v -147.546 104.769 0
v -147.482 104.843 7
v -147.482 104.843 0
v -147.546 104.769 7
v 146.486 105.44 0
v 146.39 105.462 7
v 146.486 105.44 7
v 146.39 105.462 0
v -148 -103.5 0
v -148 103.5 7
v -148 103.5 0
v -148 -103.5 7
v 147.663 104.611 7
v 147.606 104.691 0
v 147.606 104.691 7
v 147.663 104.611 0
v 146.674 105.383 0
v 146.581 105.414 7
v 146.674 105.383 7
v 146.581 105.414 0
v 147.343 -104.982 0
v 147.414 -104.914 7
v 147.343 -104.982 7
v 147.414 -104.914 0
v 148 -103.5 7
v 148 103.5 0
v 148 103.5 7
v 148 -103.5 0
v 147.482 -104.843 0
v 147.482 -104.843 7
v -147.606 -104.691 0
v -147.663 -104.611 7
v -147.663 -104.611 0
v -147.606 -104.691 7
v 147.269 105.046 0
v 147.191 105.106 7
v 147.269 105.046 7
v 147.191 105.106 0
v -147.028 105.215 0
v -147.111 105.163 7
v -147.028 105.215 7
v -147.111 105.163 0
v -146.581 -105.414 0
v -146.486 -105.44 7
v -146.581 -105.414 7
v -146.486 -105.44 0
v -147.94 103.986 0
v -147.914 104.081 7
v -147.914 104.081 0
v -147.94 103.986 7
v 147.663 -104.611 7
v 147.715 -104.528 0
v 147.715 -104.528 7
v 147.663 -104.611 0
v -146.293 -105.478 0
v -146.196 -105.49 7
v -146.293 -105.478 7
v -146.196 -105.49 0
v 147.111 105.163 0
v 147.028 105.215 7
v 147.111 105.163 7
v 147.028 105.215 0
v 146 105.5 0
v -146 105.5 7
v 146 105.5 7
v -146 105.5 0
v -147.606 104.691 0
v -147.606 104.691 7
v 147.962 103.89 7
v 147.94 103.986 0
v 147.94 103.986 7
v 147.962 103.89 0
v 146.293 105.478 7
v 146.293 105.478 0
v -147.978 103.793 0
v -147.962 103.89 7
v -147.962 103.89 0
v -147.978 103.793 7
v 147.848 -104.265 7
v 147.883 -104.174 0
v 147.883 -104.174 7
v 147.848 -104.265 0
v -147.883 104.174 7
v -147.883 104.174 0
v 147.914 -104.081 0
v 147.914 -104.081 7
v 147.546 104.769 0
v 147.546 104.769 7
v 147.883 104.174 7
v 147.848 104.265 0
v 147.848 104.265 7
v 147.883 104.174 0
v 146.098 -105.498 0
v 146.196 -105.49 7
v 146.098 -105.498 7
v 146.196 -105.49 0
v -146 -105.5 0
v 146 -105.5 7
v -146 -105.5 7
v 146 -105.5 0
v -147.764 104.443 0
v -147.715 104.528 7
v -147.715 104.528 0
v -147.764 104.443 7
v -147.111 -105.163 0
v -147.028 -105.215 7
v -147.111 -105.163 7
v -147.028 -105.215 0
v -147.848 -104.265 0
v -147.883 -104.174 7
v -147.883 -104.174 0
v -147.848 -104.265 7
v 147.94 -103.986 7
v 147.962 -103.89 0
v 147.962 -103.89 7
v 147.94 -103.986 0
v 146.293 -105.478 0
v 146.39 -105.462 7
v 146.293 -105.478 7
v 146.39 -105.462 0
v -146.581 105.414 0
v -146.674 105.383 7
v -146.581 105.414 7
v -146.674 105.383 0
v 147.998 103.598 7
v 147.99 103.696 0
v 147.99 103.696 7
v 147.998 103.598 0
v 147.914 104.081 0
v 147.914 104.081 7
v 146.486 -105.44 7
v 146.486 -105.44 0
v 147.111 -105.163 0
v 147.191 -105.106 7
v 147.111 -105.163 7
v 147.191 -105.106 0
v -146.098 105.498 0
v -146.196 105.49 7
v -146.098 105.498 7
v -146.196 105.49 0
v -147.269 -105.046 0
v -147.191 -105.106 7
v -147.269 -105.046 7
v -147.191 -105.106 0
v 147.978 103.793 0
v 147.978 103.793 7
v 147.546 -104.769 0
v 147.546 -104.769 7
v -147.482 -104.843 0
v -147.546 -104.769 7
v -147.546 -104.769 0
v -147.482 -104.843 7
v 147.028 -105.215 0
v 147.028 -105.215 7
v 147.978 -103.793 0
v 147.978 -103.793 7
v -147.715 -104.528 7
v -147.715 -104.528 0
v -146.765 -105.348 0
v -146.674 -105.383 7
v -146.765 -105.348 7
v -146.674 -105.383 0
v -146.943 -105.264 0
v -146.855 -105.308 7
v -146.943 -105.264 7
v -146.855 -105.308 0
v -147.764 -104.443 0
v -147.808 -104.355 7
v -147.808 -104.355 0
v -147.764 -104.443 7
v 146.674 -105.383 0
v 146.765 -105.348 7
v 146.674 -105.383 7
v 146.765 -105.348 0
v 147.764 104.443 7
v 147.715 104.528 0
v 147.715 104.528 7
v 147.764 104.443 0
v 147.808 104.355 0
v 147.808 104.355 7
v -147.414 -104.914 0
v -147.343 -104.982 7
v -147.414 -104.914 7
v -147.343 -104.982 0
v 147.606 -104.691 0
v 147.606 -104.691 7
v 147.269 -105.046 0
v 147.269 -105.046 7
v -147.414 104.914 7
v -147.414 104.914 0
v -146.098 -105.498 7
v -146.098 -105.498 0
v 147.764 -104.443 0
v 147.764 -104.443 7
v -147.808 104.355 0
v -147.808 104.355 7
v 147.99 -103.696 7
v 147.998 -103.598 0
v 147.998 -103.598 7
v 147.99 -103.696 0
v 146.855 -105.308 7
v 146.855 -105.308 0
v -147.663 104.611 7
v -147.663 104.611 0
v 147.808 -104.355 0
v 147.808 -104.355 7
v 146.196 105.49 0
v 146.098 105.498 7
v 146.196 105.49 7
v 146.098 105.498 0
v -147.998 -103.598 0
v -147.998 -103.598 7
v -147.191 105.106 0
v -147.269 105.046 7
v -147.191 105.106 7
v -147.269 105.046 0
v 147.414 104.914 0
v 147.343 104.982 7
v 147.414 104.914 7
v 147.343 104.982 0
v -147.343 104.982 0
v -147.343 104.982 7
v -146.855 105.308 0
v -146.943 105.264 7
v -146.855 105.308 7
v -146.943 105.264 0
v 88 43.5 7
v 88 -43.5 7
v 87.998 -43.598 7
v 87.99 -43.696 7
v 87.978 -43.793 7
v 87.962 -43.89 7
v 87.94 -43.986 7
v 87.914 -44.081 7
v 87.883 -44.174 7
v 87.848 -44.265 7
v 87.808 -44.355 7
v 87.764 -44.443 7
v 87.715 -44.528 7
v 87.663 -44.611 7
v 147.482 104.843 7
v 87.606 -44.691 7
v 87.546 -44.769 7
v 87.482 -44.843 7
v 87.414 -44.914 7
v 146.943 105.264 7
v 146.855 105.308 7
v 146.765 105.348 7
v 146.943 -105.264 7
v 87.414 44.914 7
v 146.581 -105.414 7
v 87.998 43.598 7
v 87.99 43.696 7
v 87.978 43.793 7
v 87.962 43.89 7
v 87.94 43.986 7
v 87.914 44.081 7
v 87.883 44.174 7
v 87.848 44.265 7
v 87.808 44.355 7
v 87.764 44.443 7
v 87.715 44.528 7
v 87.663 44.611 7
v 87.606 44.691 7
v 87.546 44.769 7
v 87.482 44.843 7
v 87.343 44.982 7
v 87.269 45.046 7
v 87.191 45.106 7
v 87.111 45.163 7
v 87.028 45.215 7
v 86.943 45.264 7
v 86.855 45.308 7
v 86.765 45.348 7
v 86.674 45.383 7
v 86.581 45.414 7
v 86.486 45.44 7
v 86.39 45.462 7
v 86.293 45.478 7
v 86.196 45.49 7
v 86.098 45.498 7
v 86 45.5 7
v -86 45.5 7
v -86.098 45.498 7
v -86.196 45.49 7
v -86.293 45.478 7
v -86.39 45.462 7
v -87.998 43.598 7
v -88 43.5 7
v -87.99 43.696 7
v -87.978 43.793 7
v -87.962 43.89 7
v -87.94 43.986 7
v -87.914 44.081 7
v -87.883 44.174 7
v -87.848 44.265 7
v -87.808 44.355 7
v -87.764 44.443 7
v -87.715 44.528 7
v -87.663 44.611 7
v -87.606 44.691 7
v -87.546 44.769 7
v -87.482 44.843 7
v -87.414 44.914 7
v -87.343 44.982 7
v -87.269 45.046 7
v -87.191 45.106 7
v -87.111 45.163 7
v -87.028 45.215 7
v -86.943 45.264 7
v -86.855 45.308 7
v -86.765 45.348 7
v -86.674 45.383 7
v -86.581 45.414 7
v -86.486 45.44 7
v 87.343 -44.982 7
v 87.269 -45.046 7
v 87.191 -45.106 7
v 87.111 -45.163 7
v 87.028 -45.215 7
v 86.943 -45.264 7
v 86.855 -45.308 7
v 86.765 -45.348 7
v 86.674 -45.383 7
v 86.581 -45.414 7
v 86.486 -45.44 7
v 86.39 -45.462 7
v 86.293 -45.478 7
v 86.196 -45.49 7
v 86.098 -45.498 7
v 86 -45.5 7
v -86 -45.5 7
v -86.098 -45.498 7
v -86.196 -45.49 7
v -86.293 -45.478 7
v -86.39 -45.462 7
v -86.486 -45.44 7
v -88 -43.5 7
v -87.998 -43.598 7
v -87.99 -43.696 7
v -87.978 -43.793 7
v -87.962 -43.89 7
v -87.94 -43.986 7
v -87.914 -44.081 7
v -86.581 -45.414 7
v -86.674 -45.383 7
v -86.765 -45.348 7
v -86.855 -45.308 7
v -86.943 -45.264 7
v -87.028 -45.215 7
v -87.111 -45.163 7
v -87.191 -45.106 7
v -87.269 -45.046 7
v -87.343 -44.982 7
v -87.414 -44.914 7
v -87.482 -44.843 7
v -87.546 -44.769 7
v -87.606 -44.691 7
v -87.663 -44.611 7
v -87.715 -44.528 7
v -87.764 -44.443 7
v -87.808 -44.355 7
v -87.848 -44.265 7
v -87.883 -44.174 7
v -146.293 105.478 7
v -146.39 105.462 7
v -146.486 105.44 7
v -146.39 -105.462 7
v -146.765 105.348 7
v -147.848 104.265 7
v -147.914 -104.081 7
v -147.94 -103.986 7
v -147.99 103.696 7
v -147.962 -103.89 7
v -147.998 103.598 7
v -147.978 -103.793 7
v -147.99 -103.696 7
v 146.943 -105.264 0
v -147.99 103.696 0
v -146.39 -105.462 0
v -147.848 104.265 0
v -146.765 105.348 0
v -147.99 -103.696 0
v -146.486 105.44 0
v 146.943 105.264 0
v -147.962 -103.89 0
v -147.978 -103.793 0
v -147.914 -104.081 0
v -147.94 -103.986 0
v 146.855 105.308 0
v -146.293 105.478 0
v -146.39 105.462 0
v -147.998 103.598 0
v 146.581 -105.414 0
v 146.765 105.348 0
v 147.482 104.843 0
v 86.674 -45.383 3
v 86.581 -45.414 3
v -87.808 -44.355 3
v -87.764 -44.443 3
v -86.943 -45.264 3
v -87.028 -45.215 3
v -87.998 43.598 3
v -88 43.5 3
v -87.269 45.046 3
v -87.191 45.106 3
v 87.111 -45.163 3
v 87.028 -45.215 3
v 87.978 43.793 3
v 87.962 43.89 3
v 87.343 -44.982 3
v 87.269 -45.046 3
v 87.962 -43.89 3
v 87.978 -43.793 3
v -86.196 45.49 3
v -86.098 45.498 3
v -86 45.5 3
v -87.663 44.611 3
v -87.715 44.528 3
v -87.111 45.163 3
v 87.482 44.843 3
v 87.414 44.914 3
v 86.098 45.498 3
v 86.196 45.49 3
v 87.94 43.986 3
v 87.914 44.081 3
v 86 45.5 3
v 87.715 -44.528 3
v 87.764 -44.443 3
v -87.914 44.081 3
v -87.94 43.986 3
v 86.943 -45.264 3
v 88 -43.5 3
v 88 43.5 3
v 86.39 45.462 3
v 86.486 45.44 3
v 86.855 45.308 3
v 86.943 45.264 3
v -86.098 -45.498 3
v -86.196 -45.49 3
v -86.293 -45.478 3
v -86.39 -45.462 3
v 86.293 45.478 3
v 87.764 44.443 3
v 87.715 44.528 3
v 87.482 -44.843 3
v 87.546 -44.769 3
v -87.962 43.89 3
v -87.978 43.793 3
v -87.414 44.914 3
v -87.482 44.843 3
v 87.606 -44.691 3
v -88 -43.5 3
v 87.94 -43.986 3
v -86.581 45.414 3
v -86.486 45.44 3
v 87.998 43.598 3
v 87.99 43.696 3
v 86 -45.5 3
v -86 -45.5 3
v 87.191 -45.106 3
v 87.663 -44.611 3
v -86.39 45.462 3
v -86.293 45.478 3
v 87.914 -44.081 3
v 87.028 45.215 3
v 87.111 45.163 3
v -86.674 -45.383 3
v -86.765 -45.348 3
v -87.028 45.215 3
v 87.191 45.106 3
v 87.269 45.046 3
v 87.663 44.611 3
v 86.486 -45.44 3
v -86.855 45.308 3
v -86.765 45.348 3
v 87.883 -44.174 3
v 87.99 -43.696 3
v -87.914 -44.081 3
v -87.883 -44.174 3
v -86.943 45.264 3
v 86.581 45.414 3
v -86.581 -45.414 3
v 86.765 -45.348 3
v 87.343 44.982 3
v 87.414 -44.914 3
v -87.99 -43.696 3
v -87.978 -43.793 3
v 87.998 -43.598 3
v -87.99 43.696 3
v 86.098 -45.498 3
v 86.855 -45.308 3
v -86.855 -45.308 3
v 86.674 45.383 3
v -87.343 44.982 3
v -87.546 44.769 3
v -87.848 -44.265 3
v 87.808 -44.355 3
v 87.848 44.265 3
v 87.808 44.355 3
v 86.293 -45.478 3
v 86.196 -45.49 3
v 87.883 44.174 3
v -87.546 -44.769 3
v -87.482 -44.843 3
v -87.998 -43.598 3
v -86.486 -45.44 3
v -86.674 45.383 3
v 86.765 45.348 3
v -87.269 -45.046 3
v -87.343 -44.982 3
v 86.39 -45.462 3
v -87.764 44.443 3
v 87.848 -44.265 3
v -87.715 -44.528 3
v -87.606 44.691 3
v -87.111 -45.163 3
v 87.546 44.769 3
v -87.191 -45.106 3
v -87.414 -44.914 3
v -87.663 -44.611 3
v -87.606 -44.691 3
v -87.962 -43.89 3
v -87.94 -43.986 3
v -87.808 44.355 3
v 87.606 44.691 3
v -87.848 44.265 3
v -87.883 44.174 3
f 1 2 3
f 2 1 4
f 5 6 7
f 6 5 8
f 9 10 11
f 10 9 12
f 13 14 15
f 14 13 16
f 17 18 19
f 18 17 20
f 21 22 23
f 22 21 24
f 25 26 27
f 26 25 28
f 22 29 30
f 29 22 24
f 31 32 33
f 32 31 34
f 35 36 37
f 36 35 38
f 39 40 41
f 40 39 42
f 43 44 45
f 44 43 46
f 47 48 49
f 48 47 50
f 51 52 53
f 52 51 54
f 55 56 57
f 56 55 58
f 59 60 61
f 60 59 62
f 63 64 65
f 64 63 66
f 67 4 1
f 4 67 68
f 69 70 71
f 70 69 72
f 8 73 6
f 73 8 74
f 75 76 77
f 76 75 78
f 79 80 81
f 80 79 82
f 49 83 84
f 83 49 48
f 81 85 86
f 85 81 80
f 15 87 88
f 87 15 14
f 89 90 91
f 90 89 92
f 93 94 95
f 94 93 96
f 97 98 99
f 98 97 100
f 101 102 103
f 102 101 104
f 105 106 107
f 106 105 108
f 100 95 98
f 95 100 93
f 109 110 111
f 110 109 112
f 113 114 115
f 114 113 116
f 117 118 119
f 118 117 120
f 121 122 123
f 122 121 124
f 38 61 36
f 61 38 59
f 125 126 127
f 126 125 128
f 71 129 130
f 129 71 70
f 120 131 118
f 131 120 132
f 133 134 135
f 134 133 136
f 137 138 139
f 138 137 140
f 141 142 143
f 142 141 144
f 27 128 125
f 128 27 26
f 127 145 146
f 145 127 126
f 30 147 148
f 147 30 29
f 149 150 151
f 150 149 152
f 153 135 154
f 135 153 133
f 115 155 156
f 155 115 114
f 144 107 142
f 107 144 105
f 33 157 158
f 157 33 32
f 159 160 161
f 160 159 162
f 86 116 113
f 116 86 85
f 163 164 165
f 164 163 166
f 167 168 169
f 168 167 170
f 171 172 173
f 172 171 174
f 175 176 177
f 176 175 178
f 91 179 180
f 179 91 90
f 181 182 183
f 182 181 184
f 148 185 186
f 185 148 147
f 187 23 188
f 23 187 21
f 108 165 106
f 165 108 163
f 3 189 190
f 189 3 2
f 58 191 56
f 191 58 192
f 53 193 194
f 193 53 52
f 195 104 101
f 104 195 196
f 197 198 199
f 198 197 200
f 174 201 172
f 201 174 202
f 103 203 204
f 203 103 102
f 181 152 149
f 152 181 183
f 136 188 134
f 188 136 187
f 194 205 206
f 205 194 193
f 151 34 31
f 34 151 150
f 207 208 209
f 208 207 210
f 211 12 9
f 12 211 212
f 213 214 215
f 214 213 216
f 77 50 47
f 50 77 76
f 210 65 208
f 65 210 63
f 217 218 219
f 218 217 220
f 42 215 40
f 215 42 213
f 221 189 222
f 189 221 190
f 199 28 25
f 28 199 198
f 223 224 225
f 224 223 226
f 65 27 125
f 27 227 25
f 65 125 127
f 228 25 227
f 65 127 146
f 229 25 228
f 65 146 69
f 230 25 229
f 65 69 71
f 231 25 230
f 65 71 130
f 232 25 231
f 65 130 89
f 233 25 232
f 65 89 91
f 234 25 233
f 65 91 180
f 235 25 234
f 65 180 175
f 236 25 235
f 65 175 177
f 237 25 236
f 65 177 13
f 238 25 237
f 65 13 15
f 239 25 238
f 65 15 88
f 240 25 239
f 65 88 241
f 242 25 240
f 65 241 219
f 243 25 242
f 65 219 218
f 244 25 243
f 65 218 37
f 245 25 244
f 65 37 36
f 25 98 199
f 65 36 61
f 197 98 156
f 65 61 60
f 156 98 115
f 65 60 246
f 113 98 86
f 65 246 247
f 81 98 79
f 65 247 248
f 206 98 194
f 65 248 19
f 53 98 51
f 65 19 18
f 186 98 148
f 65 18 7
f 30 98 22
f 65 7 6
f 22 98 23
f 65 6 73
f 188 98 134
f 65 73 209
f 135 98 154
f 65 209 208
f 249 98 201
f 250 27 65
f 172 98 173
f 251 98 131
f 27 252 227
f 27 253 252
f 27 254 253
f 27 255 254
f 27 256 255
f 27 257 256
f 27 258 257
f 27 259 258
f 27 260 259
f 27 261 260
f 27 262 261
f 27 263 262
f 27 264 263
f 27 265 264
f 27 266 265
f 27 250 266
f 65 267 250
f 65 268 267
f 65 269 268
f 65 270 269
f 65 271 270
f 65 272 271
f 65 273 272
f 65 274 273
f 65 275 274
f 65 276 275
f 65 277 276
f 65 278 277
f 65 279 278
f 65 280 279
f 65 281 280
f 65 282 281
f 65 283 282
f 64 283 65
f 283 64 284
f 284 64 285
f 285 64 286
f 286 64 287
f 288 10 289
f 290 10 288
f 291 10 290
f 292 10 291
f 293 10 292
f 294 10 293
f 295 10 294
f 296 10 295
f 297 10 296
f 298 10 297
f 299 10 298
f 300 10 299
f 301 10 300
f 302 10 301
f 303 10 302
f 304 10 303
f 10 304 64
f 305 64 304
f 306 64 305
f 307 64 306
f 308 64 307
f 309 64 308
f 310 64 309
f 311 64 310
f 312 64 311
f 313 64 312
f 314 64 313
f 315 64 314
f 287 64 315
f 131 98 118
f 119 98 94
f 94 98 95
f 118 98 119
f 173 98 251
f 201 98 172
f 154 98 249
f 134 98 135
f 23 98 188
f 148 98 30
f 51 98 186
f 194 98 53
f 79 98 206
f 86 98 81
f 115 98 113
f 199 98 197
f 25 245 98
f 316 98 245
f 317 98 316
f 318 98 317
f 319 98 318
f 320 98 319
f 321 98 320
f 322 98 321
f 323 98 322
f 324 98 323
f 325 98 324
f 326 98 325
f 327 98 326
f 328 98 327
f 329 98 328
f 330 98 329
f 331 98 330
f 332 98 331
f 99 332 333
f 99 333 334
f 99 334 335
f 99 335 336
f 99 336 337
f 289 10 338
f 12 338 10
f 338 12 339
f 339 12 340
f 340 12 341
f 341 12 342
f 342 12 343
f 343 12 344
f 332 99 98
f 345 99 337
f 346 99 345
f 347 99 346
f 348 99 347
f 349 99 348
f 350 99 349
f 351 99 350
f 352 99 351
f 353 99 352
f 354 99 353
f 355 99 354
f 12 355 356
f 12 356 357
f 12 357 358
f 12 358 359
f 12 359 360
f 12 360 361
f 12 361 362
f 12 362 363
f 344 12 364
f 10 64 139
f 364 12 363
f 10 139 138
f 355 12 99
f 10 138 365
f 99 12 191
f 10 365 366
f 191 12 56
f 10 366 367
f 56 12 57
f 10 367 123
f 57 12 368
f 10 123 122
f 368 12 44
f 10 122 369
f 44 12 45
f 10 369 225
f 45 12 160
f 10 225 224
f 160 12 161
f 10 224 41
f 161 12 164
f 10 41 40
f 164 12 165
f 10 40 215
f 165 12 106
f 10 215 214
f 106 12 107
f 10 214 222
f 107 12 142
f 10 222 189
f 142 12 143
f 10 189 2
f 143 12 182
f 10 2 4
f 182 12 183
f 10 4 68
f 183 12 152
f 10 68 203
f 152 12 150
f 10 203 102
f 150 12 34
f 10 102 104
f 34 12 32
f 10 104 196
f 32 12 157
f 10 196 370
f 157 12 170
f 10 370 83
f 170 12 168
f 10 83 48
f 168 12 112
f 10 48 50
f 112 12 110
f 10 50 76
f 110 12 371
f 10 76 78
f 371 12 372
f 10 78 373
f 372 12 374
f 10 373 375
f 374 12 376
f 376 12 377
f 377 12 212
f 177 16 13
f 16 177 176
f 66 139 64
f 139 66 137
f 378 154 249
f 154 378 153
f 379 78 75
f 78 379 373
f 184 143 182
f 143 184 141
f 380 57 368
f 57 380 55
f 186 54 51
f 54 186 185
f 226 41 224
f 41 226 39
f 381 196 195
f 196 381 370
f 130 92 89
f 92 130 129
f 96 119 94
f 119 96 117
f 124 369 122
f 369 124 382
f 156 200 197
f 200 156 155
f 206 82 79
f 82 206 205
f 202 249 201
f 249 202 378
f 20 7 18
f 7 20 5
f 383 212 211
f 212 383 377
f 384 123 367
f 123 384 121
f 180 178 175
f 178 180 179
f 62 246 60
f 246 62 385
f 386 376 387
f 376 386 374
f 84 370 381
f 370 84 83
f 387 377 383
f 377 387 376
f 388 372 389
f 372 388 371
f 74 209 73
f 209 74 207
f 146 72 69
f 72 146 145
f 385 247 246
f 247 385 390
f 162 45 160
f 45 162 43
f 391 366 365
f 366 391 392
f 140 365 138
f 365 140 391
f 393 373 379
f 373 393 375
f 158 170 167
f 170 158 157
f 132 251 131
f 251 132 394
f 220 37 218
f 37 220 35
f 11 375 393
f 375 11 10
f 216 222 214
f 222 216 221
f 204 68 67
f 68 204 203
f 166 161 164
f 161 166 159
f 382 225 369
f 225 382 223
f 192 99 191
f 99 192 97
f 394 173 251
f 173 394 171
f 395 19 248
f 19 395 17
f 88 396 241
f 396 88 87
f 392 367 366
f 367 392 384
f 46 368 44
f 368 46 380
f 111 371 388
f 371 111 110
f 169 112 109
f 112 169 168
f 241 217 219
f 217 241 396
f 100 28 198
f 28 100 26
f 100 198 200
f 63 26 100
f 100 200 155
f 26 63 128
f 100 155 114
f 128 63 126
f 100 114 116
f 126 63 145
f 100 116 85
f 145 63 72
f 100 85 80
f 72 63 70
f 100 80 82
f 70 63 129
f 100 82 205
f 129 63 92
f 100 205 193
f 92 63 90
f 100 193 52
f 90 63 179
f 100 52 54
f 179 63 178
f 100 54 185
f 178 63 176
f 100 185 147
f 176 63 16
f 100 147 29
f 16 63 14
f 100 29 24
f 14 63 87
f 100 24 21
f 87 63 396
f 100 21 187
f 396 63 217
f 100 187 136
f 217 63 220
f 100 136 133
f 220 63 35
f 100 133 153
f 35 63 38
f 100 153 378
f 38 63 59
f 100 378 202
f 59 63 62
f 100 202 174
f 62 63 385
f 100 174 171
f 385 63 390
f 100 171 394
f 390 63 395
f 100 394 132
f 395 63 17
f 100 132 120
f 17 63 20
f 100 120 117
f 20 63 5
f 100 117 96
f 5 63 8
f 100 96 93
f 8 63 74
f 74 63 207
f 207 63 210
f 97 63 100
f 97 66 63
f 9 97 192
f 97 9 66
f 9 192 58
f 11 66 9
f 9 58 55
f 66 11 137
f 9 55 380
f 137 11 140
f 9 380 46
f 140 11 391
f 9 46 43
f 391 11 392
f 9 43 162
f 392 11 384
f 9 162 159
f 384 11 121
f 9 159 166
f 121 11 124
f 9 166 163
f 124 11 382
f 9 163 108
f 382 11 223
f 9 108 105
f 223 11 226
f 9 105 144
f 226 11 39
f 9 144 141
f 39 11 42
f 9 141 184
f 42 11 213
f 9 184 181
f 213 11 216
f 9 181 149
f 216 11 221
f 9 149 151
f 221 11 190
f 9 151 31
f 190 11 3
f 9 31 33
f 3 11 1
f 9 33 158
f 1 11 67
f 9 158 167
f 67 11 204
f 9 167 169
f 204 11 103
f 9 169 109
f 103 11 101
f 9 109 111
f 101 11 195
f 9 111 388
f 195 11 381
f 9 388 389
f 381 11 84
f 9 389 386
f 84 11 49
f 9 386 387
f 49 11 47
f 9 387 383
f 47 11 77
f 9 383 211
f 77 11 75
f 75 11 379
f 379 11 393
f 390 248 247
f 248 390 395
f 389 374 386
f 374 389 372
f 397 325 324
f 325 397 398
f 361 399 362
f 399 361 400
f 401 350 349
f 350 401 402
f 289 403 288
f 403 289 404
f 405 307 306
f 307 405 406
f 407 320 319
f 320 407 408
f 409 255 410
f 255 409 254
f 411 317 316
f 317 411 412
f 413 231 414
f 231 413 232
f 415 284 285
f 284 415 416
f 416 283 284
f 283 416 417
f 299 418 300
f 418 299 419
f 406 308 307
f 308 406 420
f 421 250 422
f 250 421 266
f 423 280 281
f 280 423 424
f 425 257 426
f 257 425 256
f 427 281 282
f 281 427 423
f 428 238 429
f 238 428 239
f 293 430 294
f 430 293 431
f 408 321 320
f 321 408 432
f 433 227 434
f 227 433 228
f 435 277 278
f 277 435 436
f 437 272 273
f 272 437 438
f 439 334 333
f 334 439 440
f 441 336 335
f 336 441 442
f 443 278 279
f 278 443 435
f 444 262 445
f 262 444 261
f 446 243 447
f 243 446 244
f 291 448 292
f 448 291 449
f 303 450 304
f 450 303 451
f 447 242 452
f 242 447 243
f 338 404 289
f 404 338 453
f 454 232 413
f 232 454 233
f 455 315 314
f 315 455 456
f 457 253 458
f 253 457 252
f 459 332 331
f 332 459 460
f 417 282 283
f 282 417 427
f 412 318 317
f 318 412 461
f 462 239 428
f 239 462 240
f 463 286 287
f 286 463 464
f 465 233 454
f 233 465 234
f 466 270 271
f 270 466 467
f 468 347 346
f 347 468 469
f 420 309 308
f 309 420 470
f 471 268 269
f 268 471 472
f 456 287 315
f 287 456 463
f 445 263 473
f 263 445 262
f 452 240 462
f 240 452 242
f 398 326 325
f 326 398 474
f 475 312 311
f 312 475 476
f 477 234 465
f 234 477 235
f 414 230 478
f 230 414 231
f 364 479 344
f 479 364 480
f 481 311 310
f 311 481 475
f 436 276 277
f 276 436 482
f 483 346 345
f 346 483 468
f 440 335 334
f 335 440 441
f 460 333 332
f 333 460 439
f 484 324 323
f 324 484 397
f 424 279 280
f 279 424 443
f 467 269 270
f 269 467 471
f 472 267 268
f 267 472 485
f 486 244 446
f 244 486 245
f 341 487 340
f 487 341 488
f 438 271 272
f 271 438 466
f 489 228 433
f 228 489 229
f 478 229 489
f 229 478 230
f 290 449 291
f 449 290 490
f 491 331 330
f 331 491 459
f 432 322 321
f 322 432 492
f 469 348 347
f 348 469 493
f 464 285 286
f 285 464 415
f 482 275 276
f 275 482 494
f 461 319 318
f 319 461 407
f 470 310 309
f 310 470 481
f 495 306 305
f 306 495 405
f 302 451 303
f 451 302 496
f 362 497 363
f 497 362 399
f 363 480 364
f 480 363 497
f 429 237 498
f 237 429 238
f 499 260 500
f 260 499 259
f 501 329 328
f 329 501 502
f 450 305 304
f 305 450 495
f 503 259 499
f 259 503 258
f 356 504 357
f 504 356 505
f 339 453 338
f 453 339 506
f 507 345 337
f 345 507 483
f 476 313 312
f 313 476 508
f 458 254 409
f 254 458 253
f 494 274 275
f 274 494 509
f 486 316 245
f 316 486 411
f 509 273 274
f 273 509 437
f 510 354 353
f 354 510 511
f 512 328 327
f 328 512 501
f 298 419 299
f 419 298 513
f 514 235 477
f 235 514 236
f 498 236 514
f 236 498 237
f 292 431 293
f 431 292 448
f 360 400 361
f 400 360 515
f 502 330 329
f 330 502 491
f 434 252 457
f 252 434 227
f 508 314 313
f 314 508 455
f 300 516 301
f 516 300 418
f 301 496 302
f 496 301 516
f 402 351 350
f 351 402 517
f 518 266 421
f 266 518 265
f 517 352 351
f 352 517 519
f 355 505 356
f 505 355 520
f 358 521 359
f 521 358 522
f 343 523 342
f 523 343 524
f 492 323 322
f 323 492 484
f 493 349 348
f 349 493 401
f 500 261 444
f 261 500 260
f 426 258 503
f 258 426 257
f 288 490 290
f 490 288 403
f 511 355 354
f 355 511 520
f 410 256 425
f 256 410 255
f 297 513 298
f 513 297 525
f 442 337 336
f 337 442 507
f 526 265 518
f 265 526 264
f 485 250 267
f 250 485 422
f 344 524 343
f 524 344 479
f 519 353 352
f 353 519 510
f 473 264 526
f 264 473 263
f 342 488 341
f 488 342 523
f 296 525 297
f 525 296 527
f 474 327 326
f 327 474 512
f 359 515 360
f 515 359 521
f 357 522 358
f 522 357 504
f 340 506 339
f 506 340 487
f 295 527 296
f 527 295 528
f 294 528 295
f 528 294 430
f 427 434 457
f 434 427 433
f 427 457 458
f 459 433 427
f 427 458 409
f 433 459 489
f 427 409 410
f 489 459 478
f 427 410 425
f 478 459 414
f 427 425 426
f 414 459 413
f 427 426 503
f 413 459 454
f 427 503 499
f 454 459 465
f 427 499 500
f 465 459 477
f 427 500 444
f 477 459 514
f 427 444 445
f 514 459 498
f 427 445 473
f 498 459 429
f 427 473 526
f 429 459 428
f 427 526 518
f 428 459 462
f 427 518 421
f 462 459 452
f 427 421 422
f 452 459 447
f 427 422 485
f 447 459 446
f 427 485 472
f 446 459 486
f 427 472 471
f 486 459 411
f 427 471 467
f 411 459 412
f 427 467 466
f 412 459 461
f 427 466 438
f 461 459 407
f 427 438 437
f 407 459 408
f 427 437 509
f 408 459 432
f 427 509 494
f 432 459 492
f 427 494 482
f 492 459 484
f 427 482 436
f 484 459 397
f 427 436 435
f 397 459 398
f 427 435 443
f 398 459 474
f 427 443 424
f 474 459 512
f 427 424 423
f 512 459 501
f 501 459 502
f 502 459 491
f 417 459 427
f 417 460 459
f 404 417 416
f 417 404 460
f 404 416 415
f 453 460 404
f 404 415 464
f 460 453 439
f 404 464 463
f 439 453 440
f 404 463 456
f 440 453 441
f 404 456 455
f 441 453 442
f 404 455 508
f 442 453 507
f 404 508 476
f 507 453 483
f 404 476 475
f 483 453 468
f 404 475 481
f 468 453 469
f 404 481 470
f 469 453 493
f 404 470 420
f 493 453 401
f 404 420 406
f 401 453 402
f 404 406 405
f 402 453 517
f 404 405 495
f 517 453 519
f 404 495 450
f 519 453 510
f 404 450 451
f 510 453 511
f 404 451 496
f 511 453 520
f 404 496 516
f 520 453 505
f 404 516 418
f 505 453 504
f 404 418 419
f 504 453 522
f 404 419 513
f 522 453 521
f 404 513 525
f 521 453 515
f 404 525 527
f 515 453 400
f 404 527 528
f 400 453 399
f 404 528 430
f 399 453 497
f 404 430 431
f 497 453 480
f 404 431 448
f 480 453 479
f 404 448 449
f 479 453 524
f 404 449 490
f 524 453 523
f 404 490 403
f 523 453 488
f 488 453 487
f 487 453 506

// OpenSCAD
// file: Modules/hose_slot.scad
//=====================================================================
// hose_slot.scad
//
// Rounded hose slot.
//
// Origin:
//   X = centre of slot
//   Y = centre of slot
//   Z = bottom
//
//=====================================================================


//--------------------------------------------------
// Hose slot
//--------------------------------------------------

module hose_slot(
    slot_height,
    slot_width,
    wall_thickness
)
{
    rotate([90,0,0])

    hull()
    {
        translate([
            0,
            -(slot_height / 2) + (slot_width / 2),
            0
        ])

        cylinder(
            d = slot_width,
            h = wall_thickness
        );


        translate([
            0,
             (slot_height / 2) - (slot_width / 2),
            0
        ])

        cylinder(
            d = slot_width,
            h = wall_thickness
        );
    }
}
// file: Modules/cable_slot.scad
//=====================================================================
// cable_slot.scad
//
// Rounded hose slot.
//
// Origin:
//   X = centre of slot
//   Y = centre of slot
//   Z = bottom
//
//=====================================================================


//--------------------------------------------------
// Cable slot
//--------------------------------------------------

module cable_slot(
    slot_height,
    slot_width,
    wall_thickness
)
{
    rotate([90,0,0])

    hull()
    {
        translate([
            0,
            -(slot_height / 2) + (slot_width / 2),
            0
        ])

        cylinder(
            d = slot_width,
            h = wall_thickness
        );


        translate([
            0,
             (slot_height / 2) - (slot_width / 2),
            0
        ])

        cylinder(
            d = slot_width,
            h = wall_thickness
        );
    }
}
// file: Modules/box.scad
//=====================================================================
// box.scad
//
// Generic rounded box
//
// Origin:
//   X = centre
//   Y = centre
//   Z = bottom
//
//=====================================================================


//--------------------------------------------------
// Rounded corner
//--------------------------------------------------

module corner(x, y, height, radius)
{
    translate([x, y, 0])
        cylinder(
            h = height,
            r = radius
        );
}


//--------------------------------------------------
// Outside shell
//--------------------------------------------------

module shell(
    outside_length,
    outside_width,
    outside_height,
    corner_radius
)
{
    hull()
    {
        corner(
            -(outside_length / 2) + corner_radius,
            -(outside_width / 2) + corner_radius,
            outside_height,
            corner_radius
        );

        corner(
             (outside_length / 2) - corner_radius,
            -(outside_width / 2) + corner_radius,
            outside_height,
            corner_radius
        );

        corner(
             (outside_length / 2) - corner_radius,
             (outside_width / 2) - corner_radius,
            outside_height,
            corner_radius
        );

        corner(
            -(outside_length / 2) + corner_radius,
             (outside_width / 2) - corner_radius,
            outside_height,
            corner_radius
        );
    }
}


//--------------------------------------------------
// Inside cavity
//--------------------------------------------------

module cavity(
    inside_length,
    inside_width,
    inside_height,
    wall_thickness,
    bottom_thickness,
    corner_radius,
    boolean_overlap = 1
)
{
    translate([
        0,
        0,
        bottom_thickness
    ])

    hull()
    {
        corner(
            -(inside_length / 2) + corner_radius,
            -(inside_width / 2) + corner_radius,
            inside_height + boolean_overlap,
            corner_radius
        );

        corner(
             (inside_length / 2) - corner_radius,
            -(inside_width / 2) + corner_radius,
            inside_height + boolean_overlap,
            corner_radius
        );

        corner(
             (inside_length / 2) - corner_radius,
             (inside_width / 2) - corner_radius,
            inside_height + boolean_overlap,
            corner_radius
        );

        corner(
            -(inside_length / 2) + corner_radius,
             (inside_width / 2) - corner_radius,
            inside_height + boolean_overlap,
            corner_radius
        );
    }
}


//--------------------------------------------------
// Rounded box
//--------------------------------------------------

module box(
    inside_length,
    inside_width,
    inside_height,

    wall_thickness,
    bottom_thickness,

    corner_radius,

    boolean_overlap = 1
)
{
    outside_length =
        inside_length +
        (2 * wall_thickness);

    outside_width =
        inside_width +
        (2 * wall_thickness);

    outside_height =
        inside_height +
        bottom_thickness;

    difference()
    {
        shell(
            outside_length,
            outside_width,
            outside_height,
            corner_radius
        );

        cavity(
            inside_length,
            inside_width,
            inside_height,
            wall_thickness,
            bottom_thickness,
            corner_radius,
            boolean_overlap
        );
    }
}
// file: YAPPE_Parameters.scad
//=====================================================================
// YAPPE Parameters
//=====================================================================


//--------------------------------------------------
// Bottom plate
//--------------------------------------------------

bottom_length = 170;       // mm
bottom_width  = 85;        // mm

bottom_thickness = 4;      // mm

corner_radius = 8;         // mm

//--------------------------------------------------
// Wall
//--------------------------------------------------

bottom_flange = 3;         // mm

wall_height   = 60;        // mm
wall_thickness = 3;        // mm

//--------------------------------------------------
// Bridges
//--------------------------------------------------

bridge_length = 90;
bridge_width  = 8;
bridge_height = 8;

// Distance from centre to each bridge

bridge_offset = 22;
//--------------------------------------------------
// Derived
//--------------------------------------------------

wall_length =
    bottom_length -
    (2 * bottom_flange);

wall_width =
    bottom_width -
    (2 * bottom_flange);
	





//--------------------------------------------------
// Rendering
//--------------------------------------------------

preview_fn = 24;
render_fn  = 128;

$fn = $preview ? preview_fn : render_fn;
// main file
//=====================================================================
// YAPPE
// OuterBox
//=====================================================================

include <YAPPE_Parameters.scad>

use <Modules/box.scad>

use <Modules/cable_slot.scad>
use <Modules/hose_slot.scad>


//=====================================================================
// OUTER BOX
//=====================================================================

module outer_box()
{
    difference()
    {
        //--------------------------------------------------
        // Positive geometry
        //--------------------------------------------------

box(
    bottom_length + 6,
    bottom_width + 6,
    bottom_thickness,

    wall_height,
    wall_thickness,

    bottom_flange - 1,

    corner_radius
);

        //--------------------------------------------------
        // Cable slot
        //--------------------------------------------------

        translate([
            -((bottom_length + 2) / 2 +2),
            -10,
            wall_height - 5
        ])

        rotate([0,0,90])

        cable_slot(
            50,
            8,
            20
        );


        //--------------------------------------------------
        // Hose slot
        //--------------------------------------------------

        translate([
             ((bottom_length + 2) / 2) - 10,
            0,
            wall_height - 5
        ])

        rotate([0,0,90])

        hose_slot(
            50,
            10,
            20
        );
    }
}


//=====================================================================
// Render
//=====================================================================

outer_box();
